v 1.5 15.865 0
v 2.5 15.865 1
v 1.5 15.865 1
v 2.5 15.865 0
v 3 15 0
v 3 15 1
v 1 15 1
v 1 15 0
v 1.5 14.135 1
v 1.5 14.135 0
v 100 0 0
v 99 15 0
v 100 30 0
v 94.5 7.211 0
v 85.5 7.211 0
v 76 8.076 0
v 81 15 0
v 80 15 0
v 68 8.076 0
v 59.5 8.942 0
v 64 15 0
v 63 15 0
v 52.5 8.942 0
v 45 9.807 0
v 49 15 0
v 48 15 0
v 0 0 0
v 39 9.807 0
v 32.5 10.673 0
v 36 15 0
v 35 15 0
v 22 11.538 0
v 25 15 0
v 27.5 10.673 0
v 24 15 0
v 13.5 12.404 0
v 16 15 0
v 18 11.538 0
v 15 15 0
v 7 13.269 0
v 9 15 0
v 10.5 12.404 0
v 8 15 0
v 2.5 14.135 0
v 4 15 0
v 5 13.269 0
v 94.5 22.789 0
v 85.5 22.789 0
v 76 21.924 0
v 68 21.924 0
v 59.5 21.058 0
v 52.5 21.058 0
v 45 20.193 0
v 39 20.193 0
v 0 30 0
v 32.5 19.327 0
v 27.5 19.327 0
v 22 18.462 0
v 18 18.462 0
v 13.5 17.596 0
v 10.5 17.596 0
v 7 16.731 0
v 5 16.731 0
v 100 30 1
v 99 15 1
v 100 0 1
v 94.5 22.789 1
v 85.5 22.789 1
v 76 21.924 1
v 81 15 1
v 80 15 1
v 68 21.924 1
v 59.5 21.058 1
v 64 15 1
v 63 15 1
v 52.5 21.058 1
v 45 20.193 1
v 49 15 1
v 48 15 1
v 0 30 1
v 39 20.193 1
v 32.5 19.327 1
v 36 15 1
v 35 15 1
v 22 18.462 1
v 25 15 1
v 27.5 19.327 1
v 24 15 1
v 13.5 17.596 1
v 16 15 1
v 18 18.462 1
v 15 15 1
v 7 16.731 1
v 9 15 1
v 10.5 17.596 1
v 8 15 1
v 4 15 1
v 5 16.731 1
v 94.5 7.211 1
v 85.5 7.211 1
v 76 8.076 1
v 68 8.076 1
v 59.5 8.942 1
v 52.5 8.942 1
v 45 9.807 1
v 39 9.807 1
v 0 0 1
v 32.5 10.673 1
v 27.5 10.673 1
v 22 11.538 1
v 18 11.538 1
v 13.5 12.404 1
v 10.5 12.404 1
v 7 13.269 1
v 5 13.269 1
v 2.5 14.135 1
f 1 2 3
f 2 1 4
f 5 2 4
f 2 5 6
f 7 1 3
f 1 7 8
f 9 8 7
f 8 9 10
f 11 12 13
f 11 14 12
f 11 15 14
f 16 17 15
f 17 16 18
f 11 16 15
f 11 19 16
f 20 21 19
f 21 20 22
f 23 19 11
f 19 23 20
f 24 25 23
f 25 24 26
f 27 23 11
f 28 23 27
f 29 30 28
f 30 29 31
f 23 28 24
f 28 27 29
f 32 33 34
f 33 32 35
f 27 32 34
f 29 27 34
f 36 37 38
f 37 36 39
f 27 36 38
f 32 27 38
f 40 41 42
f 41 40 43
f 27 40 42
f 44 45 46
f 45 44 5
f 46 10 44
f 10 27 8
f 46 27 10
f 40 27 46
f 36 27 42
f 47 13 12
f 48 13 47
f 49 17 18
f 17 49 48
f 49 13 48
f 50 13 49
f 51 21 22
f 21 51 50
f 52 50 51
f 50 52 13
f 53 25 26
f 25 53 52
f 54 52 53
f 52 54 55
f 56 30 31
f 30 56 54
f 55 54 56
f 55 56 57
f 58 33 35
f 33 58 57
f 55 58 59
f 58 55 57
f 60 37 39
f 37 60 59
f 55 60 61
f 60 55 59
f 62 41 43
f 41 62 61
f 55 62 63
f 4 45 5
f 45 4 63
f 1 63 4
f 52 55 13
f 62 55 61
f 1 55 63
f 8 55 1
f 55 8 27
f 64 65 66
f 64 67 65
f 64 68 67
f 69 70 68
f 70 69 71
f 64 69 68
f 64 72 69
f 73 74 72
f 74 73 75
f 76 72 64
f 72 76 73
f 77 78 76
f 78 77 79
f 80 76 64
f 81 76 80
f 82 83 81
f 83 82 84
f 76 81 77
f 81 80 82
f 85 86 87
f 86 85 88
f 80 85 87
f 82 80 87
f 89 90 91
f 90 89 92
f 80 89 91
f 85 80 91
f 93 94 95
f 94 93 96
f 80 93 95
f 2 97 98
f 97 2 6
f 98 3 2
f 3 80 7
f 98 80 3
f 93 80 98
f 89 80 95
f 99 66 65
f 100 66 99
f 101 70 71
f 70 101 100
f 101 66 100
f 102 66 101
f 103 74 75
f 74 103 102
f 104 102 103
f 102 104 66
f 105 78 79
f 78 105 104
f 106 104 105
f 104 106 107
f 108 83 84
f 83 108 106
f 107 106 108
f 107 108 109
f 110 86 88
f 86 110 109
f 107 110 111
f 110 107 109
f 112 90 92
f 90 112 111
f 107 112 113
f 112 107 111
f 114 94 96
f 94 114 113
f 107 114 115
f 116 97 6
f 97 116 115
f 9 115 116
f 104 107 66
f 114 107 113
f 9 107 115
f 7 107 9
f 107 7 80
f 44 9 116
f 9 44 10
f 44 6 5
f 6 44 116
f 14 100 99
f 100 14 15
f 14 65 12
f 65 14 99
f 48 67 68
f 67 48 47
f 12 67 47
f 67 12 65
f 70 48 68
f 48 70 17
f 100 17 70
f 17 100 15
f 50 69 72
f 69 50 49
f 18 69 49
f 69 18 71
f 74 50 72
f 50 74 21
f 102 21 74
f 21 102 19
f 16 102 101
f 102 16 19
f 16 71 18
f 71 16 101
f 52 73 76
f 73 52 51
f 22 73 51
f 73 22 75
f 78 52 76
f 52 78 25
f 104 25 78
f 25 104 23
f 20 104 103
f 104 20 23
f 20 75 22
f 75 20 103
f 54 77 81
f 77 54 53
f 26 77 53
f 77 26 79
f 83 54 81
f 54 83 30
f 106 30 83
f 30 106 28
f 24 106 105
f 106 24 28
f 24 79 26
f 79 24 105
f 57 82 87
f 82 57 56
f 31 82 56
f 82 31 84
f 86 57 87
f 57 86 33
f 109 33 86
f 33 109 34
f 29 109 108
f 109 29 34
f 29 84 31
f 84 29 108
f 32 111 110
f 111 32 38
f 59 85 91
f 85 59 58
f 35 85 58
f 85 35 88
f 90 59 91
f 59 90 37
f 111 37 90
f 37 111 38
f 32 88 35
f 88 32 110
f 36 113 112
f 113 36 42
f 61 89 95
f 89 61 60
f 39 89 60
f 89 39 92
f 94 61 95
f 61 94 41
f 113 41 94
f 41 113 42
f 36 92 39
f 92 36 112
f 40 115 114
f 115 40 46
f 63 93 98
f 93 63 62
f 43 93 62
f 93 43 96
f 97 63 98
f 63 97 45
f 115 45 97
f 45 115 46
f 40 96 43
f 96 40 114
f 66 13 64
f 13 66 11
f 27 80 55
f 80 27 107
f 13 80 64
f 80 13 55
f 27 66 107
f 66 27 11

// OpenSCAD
difference() {
  translate([50.0000000000, 15.0000000000, 0.5000000000]) {
    scale([100.0000000000, 30.0000000000, 1.0000000000]) {
      translate([-0.5000000000, -0.5000000000, -0.5000000000]) {
        cube([1, 1, 1]);
      }
    }
  }
  union() {
    union() {
      union() {
        union() {
          union() {
            union() {
              union() {
                union() {
                  translate([2.0000000000, 15.0000000000, 0.5000000000]) {
                    scale([2.0000000000, 1.7320000000, 1.0000000000]) {
                      rotate([0.0000000000, 0.0000000000, -0.0000000000]) {
                        scale([0.5, 0.577, 1]) cylinder($fn = 6, center = true);
                      }
                    }
                  }
                  translate([90.0000000000, 15.0000128460, 0.5000000000]) {
                    scale([18.0000000000, 15.5880000000, 1.0000000000]) {
                      rotate([0.0000000000, 0.0000000000, -0.0000000000]) {
                        scale([0.5, 0.577, 1]) cylinder($fn = 6, center = true);
                      }
                    }
                  }
                }
                translate([72.0000000000, 15.0000000000, 0.5000000000]) {
                  scale([16.0000000000, 13.8560000000, 1.0000000000]) {
                    rotate([0.0000000000, 0.0000000000, -0.0000000000]) {
                      scale([0.5, 0.577, 1]) cylinder($fn = 6, center = true);
                    }
                  }
                }
              }
              translate([56.0000000000, 15.0000000000, 0.5000000000]) {
                scale([14.0000000000, 12.1240000000, 1.0000000000]) {
                  rotate([0.0000000000, 0.0000000000, -0.0000000000]) {
                    scale([0.5, 0.577, 1]) cylinder($fn = 6, center = true);
                  }
                }
              }
            }
            translate([42.0000000000, 15.0000000000, 0.5000000000]) {
              scale([12.0000000000, 10.3920000000, 1.0000000000]) {
                rotate([0.0000000000, 0.0000000000, -0.0000000000]) {
                  scale([0.5, 0.577, 1]) cylinder($fn = 6, center = true);
                }
              }
            }
          }
          translate([30.0000000000, 15.0000000000, 0.5000000000]) {
            scale([10.0000000000, 8.6600000000, 1.0000000000]) {
              rotate([0.0000000000, 0.0000000000, -0.0000000000]) {
                scale([0.5, 0.577, 1]) cylinder($fn = 6, center = true);
              }
            }
          }
        }
        translate([20.0000000000, 15.0000000000, 0.5000000000]) {
          scale([8.0000000000, 6.9280000000, 1.0000000000]) {
            rotate([0.0000000000, 0.0000000000, -0.0000000000]) {
              scale([0.5, 0.577, 1]) cylinder($fn = 6, center = true);
            }
          }
        }
      }
      translate([12.0000000000, 15.0000000000, 0.5000000000]) {
        scale([6.0000000000, 5.1960000000, 1.0000000000]) {
          rotate([0.0000000000, 0.0000000000, -0.0000000000]) {
            scale([0.5, 0.577, 1]) cylinder($fn = 6, center = true);
          }
        }
      }
    }
    translate([6.0000000000, 15.0000000000, 0.5000000000]) {
      scale([4.0000000000, 3.4640000000, 1.0000000000]) {
        rotate([0.0000000000, 0.0000000000, -0.0000000000]) {
          scale([0.5, 0.577, 1]) cylinder($fn = 6, center = true);
        }
      }
    }
  }
}
